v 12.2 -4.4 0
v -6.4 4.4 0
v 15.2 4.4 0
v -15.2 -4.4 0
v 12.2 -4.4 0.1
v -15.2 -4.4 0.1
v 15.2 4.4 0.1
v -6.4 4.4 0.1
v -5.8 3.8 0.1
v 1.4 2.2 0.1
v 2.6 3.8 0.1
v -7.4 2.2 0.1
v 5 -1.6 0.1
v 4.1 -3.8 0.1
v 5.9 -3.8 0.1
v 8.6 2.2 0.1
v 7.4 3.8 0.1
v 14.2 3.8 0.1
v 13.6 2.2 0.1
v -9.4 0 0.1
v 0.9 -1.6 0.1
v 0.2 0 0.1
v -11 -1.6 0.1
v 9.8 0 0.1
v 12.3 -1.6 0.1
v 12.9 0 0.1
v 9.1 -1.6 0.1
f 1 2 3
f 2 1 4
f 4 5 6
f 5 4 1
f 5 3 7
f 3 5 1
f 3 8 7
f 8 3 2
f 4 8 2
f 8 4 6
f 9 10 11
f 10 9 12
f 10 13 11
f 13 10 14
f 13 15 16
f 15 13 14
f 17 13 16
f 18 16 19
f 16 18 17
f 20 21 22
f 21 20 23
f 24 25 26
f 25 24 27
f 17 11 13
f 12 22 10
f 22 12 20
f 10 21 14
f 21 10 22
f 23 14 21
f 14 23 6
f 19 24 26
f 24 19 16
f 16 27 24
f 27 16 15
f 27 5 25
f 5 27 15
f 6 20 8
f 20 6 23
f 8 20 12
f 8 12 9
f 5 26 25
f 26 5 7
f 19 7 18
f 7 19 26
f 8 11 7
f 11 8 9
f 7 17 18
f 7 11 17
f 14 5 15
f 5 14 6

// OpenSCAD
use <../lib.scad>
function ldraw_lib__165485e() = [
// 0 Sticker  1.1 x  3.8 Trapezoid with Blue V and Red Lines Left on Transparent Background
// 0 Name: 165485e.dat
// 0 Author: Takeshi Takahashi [RainbowDolphin]
// 0 !LDRAW_ORG Part UPDATE 2022-06
// 0 !LICENSE Licensed under CC BY 2.0 and CC BY 4.0 : see CAreadme.txt
// 
// 0 BFC CERTIFY CCW
  [0,"BFC","CERTIFY"],
  [0,"BFC","CCW"],
// 
// 0 !KEYWORDS Bricklink 6346stk01, Brickowl 418865, Orbiter, Rebrickable 165485
// 0 !KEYWORDS set 6346, Space Shuttle
// 
// 0 !HISTORY 2022-06-18 [RainbowDolphin] Created based on 165485a by David Manley [djm]
// 0 !HISTORY 2022-12-20 [PTadmin] Official Update 2022-06
// 
// 
// 4 16 -38 0 -11 -16 0 11 38 0 11 30.5 0 -11
  [4,16,-38,0,-11,-16,0,11,38,0,11,30.5,0,-11],
// 4 16 30.5 -.25 -11 -38 -.25 -11 -38 0 -11 30.5 0 -11
  [4,16,30.5,-.25,-11,-38,-.25,-11,-38,0,-11,30.5,0,-11],
// 4 16 38 -.25 11 30.5 -.25 -11 30.5 0 -11 38 0 11
  [4,16,38,-.25,11,30.5,-.25,-11,30.5,0,-11,38,0,11],
// 4 16 -16 -.25 11 38 -.25 11 38 0 11 -16 0 11
  [4,16,-16,-.25,11,38,-.25,11,38,0,11,-16,0,11],
// 4 16 -38 -.25 -11 -16 -.25 11 -16 0 11 -38 0 -11
  [4,16,-38,-.25,-11,-16,-.25,11,-16,0,11,-38,0,-11],
// 0 BFC NOCLIP
  [0,"BFC","NOCLIP"],
// 4 1 -18.5 -.25 5.5 3.5 -.25 5.5 6.5 -.25 9.5 -14.5 -.25 9.5
  [4,1,-18.5,-.25,5.5,3.5,-.25,5.5,6.5,-.25,9.5,-14.5,-.25,9.5],
// 4 1 10.25 -.25 -9.5 12.5 -.25 -4 6.5 -.25 9.5 3.5 -.25 5.5
  [4,1,10.25,-.25,-9.5,12.5,-.25,-4,6.5,-.25,9.5,3.5,-.25,5.5],
// 4 1 12.5 -.25 -4 10.25 -.25 -9.5 14.75 -.25 -9.5 21.5 -.25 5.5
  [4,1,12.5,-.25,-4,10.25,-.25,-9.5,14.75,-.25,-9.5,21.5,-.25,5.5],
// 3 1 18.5 -.25 9.5 12.5 -.25 -4 21.5 -.25 5.5
  [3,1,18.5,-.25,9.5,12.5,-.25,-4,21.5,-.25,5.5],
// 4 1 35.5 -.25 9.5 18.5 -.25 9.5 21.5 -.25 5.5 34 -.25 5.5
  [4,1,35.5,-.25,9.5,18.5,-.25,9.5,21.5,-.25,5.5,34,-.25,5.5],
// 4 4 -27.5 -.25 -4 2.25 -.25 -4 .5 -.25 0 -23.5 -.25 0
  [4,4,-27.5,-.25,-4,2.25,-.25,-4,.5,-.25,0,-23.5,-.25,0],
// 4 4 32.25 -.25 0 24.5 -.25 0 22.75 -.25 -4 30.75 -.25 -4
  [4,4,32.25,-.25,0,24.5,-.25,0,22.75,-.25,-4,30.75,-.25,-4],
// 0 BFC CLIP
  [0,"BFC","CLIP"],
// 3 16 18.5 -.25 9.5 6.5 -.25 9.5 12.5 -.25 -4
  [3,16,18.5,-.25,9.5,6.5,-.25,9.5,12.5,-.25,-4],
// 4 16 -23.5 -.25 0 .5 -.25 0 3.5 -.25 5.5 -18.5 -.25 5.5
  [4,16,-23.5,-.25,0,.5,-.25,0,3.5,-.25,5.5,-18.5,-.25,5.5],
// 4 16 3.5 -.25 5.5 .5 -.25 0 2.25 -.25 -4 10.25 -.25 -9.5
  [4,16,3.5,-.25,5.5,.5,-.25,0,2.25,-.25,-4,10.25,-.25,-9.5],
// 4 16 10.25 -.25 -9.5 2.25 -.25 -4 -27.5 -.25 -4 -38 -.25 -11
  [4,16,10.25,-.25,-9.5,2.25,-.25,-4,-27.5,-.25,-4,-38,-.25,-11],
// 4 16 34 -.25 5.5 21.5 -.25 5.5 24.5 -.25 0 32.25 -.25 0
  [4,16,34,-.25,5.5,21.5,-.25,5.5,24.5,-.25,0,32.25,-.25,0],
// 4 16 14.75 -.25 -9.5 22.75 -.25 -4 24.5 -.25 0 21.5 -.25 5.5
  [4,16,14.75,-.25,-9.5,22.75,-.25,-4,24.5,-.25,0,21.5,-.25,5.5],
// 4 16 30.75 -.25 -4 22.75 -.25 -4 14.75 -.25 -9.5 30.5 -.25 -11
  [4,16,30.75,-.25,-4,22.75,-.25,-4,14.75,-.25,-9.5,30.5,-.25,-11],
// 4 16 -38 -.25 -11 -27.5 -.25 -4 -23.5 -.25 0 -16 -.25 11
  [4,16,-38,-.25,-11,-27.5,-.25,-4,-23.5,-.25,0,-16,-.25,11],
// 3 16 -16 -.25 11 -23.5 -.25 0 -18.5 -.25 5.5
  [3,16,-16,-.25,11,-23.5,-.25,0,-18.5,-.25,5.5],
// 3 16 -16 -.25 11 -18.5 -.25 5.5 -14.5 -.25 9.5
  [3,16,-16,-.25,11,-18.5,-.25,5.5,-14.5,-.25,9.5],
// 4 16 38 -.25 11 32.25 -.25 0 30.75 -.25 -4 30.5 -.25 -11
  [4,16,38,-.25,11,32.25,-.25,0,30.75,-.25,-4,30.5,-.25,-11],
// 4 16 34 -.25 5.5 32.25 -.25 0 38 -.25 11 35.5 -.25 9.5
  [4,16,34,-.25,5.5,32.25,-.25,0,38,-.25,11,35.5,-.25,9.5],
// 4 16 -16 -.25 11 -14.5 -.25 9.5 6.5 -.25 9.5 38 -.25 11
  [4,16,-16,-.25,11,-14.5,-.25,9.5,6.5,-.25,9.5,38,-.25,11],
// 3 16 38 -.25 11 18.5 -.25 9.5 35.5 -.25 9.5
  [3,16,38,-.25,11,18.5,-.25,9.5,35.5,-.25,9.5],
// 3 16 38 -.25 11 6.5 -.25 9.5 18.5 -.25 9.5
  [3,16,38,-.25,11,6.5,-.25,9.5,18.5,-.25,9.5],
// 4 16 -38 -.25 -11 30.5 -.25 -11 14.75 -.25 -9.5 10.25 -.25 -9.5
  [4,16,-38,-.25,-11,30.5,-.25,-11,14.75,-.25,-9.5,10.25,-.25,-9.5],
];
makepoly(ldraw_lib__165485e(), line=0.2);
